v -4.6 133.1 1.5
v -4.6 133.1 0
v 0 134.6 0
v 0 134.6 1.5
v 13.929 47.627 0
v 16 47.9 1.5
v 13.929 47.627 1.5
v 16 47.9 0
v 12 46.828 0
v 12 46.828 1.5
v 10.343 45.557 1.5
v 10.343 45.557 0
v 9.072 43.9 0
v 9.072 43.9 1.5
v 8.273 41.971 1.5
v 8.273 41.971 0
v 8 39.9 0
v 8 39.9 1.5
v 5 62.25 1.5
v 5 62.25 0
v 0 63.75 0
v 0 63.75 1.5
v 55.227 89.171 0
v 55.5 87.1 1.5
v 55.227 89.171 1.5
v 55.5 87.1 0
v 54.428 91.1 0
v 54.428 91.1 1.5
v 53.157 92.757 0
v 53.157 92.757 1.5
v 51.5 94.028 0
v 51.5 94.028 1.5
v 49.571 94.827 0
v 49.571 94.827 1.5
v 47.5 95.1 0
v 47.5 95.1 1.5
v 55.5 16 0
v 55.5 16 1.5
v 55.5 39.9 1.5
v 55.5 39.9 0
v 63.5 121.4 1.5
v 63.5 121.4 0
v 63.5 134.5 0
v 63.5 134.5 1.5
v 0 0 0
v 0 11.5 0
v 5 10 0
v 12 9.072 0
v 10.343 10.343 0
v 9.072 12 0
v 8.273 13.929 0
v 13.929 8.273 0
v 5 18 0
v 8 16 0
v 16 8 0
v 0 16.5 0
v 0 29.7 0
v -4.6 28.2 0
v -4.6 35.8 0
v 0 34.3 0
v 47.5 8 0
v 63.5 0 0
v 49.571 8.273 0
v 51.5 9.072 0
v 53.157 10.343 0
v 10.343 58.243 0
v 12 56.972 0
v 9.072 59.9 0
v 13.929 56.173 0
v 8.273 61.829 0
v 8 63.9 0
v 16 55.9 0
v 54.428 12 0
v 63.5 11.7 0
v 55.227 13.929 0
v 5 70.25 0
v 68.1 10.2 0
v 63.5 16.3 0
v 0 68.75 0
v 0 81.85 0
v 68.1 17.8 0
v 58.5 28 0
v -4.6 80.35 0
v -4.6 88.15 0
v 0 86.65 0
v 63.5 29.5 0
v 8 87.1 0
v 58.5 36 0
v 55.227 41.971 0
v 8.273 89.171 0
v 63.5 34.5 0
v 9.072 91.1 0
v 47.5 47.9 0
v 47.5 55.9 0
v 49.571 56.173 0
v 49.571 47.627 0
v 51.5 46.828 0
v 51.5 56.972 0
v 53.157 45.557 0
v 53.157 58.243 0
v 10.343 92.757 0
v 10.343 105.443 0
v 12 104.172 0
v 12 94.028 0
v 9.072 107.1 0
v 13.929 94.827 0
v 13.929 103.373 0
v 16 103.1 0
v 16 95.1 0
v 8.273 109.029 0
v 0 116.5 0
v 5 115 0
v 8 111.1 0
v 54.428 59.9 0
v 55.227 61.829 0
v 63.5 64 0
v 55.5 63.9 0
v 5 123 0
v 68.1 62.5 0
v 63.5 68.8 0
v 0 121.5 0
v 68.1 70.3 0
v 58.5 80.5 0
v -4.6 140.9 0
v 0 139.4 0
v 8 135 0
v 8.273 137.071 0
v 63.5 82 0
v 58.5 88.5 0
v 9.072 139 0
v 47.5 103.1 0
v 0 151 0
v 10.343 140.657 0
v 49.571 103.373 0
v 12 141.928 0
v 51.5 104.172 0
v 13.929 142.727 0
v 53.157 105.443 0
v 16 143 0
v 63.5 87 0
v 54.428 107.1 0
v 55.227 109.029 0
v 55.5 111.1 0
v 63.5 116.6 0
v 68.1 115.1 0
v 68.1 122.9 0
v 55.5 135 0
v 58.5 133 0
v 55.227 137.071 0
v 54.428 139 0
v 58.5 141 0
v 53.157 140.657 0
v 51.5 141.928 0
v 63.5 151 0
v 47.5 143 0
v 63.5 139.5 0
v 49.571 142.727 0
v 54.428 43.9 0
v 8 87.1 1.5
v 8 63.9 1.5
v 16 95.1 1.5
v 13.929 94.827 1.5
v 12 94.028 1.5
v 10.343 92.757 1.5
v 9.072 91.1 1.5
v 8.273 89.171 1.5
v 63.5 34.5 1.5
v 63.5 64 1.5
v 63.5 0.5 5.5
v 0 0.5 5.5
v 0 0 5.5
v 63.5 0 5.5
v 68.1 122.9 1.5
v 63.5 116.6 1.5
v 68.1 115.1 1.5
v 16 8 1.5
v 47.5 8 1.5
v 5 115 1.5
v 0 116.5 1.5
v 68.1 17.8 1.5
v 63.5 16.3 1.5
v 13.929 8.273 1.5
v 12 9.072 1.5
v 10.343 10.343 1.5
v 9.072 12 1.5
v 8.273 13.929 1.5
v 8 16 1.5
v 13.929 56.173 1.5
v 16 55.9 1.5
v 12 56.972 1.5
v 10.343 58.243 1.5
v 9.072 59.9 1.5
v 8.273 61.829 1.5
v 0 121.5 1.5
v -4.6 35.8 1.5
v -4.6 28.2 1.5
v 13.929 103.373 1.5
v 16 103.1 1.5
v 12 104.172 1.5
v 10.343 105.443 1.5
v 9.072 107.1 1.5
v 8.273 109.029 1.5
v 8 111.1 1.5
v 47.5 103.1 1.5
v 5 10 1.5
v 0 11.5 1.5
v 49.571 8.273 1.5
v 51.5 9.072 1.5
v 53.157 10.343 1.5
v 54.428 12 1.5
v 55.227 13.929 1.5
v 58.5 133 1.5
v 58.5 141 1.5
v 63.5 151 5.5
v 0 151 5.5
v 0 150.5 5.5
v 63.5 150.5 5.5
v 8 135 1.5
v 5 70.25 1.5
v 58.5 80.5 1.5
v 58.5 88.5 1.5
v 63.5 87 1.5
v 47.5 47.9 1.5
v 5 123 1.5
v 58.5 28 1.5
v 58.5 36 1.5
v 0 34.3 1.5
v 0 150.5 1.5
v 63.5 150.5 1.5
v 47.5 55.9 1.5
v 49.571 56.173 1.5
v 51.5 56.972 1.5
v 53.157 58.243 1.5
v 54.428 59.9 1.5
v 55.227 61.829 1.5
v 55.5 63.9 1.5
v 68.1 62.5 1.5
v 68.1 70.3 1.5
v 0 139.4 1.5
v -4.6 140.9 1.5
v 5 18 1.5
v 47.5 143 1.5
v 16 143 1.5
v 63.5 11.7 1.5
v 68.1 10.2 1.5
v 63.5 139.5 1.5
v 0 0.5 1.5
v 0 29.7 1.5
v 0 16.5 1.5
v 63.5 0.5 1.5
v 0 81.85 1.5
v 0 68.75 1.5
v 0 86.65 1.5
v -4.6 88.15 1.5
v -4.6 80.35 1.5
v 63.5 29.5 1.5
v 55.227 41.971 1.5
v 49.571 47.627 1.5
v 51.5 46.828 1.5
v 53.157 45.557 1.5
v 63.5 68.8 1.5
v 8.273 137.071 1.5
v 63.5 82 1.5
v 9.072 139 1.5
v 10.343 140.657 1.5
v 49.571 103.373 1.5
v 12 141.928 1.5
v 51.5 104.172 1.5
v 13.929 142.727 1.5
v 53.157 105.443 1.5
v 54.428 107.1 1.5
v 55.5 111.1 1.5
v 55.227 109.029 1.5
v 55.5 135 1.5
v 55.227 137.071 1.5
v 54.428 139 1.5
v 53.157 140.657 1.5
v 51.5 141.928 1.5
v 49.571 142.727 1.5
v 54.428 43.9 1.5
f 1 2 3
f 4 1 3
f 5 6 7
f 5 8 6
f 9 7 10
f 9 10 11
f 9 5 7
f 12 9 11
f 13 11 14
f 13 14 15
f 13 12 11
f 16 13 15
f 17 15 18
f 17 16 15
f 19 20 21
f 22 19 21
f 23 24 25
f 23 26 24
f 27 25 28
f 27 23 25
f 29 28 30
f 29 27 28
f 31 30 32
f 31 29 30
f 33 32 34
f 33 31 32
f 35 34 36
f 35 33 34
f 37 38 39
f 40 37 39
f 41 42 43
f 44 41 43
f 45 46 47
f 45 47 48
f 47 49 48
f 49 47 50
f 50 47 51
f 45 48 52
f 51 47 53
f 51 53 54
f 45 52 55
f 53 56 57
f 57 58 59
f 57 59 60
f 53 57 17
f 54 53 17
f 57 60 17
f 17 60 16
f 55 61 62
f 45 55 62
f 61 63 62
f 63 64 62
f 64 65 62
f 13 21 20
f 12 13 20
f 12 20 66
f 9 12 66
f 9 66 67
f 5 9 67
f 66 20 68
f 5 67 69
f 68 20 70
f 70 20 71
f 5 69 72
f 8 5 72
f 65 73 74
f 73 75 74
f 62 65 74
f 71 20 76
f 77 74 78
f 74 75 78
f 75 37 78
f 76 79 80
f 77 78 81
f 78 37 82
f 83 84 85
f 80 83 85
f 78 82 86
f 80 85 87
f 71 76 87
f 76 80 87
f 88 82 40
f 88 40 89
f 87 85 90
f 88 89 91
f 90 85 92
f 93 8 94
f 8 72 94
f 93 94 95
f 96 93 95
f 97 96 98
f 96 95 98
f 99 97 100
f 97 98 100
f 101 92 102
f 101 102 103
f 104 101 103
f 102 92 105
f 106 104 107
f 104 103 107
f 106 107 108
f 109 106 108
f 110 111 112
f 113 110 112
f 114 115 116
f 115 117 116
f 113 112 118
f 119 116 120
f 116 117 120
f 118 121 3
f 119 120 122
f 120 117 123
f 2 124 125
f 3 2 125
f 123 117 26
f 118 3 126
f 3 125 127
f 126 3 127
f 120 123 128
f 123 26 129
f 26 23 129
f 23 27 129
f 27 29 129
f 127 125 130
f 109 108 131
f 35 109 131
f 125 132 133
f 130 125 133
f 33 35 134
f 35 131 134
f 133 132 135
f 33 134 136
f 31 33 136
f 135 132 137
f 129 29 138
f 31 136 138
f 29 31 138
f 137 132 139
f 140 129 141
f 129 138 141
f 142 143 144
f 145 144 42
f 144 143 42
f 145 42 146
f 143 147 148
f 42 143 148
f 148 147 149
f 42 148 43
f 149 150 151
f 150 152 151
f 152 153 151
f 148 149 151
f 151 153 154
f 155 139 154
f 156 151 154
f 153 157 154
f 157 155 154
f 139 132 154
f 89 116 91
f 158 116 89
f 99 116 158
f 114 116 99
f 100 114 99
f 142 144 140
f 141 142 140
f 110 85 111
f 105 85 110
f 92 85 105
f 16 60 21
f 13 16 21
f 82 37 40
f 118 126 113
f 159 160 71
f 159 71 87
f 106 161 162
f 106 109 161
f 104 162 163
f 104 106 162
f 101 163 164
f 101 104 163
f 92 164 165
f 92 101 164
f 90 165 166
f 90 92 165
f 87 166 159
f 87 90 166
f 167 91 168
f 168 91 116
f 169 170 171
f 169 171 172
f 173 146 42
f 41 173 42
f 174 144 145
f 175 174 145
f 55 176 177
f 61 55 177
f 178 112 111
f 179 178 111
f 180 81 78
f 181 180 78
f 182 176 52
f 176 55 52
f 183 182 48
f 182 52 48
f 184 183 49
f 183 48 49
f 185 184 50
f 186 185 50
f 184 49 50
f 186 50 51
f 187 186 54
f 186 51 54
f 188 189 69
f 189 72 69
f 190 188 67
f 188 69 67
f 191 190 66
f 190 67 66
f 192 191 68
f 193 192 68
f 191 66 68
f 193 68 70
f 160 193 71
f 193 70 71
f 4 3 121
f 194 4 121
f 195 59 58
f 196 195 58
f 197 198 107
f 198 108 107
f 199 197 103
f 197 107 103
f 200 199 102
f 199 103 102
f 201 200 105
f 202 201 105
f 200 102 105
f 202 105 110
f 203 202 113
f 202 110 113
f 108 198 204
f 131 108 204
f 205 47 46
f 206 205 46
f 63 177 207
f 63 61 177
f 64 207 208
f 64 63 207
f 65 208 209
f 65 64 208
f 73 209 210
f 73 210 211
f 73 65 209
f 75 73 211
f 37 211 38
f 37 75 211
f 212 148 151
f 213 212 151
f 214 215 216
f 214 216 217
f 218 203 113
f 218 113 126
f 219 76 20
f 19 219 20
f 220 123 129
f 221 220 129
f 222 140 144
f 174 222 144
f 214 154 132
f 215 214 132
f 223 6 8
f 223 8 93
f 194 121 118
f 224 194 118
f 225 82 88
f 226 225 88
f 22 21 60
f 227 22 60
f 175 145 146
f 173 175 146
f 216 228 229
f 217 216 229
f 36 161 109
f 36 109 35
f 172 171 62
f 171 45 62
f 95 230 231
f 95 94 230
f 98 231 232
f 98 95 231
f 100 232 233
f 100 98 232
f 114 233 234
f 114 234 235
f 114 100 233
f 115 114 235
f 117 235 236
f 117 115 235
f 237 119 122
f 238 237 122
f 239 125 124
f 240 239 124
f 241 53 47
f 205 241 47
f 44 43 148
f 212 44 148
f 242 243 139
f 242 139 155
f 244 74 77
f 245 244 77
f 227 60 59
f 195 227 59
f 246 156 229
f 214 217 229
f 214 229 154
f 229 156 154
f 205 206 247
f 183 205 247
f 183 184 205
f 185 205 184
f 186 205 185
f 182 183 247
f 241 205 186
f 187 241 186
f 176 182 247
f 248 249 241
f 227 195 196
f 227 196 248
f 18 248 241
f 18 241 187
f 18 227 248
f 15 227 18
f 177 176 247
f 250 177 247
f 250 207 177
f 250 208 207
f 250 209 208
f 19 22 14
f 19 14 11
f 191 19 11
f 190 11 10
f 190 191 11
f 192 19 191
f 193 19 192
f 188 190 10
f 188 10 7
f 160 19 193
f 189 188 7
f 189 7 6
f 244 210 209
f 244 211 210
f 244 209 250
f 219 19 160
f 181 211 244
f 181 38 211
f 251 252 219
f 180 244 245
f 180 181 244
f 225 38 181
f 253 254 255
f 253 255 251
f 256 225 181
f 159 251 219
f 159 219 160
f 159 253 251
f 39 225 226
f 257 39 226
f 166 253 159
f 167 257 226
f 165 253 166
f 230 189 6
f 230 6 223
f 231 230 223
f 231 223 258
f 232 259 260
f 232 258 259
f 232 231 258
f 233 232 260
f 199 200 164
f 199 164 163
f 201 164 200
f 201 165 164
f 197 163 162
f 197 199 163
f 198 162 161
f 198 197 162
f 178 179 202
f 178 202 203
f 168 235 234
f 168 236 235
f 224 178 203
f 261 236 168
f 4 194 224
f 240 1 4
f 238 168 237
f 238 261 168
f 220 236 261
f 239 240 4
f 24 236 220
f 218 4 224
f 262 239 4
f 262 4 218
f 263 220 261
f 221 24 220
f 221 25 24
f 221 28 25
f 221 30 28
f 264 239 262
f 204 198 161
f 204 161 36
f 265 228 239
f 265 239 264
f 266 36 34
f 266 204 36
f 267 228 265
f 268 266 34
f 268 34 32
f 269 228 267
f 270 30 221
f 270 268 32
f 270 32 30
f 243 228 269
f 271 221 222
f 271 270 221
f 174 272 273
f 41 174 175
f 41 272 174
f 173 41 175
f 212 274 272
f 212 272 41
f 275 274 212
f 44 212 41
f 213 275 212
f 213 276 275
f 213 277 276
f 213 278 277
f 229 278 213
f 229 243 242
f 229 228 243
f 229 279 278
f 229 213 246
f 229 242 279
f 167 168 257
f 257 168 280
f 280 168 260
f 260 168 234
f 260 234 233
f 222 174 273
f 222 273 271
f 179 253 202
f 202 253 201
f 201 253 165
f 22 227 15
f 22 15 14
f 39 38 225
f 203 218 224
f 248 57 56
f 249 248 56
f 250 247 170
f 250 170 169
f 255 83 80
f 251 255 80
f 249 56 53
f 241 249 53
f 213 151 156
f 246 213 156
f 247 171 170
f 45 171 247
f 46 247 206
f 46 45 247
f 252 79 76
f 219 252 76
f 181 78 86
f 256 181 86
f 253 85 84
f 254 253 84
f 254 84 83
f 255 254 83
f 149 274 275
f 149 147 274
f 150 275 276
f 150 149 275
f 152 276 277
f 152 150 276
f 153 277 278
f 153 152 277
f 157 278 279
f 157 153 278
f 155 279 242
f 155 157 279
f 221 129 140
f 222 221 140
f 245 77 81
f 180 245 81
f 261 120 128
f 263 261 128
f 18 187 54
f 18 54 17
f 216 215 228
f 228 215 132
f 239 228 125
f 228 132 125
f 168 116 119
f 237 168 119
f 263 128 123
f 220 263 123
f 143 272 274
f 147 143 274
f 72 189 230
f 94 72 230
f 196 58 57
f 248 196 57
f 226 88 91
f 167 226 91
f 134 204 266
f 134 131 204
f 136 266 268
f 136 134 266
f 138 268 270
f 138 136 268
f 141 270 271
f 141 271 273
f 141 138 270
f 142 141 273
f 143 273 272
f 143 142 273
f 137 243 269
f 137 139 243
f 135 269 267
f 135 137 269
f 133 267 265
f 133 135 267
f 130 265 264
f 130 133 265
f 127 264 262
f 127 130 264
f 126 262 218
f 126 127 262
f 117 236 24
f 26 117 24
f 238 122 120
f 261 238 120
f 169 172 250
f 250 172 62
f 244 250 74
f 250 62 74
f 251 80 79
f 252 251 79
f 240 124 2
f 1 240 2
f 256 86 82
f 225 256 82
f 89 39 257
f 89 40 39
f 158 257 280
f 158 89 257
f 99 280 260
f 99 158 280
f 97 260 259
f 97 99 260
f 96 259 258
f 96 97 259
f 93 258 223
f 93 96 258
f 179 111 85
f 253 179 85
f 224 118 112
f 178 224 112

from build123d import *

# Parameters (mm, degrees)
F1_DEPTH = 1.5
F2_W     = 63.5
F2_H     = 0.5
F3_DEPTH = 4
F4_W     = 47.5
F4_H     = 39.9
F4_H_2   = 39.2
F5_DEPTH = 1.501
F6_R     = 8


with BuildPart() as f1:
    # F0 (on Top) → F1 (new body)
    with BuildSketch(Plane.XY):
        Polygon((0, 11.5), (0, 0), (63.5, 0), (63.5, 11.7), (68.1, 10.2), (68.1, 17.8), (63.5, 16.3), (63.5, 29.5), (58.5, 28), (58.5, 36), (63.5, 34.5), (63.5, 64), (68.1, 62.5), (68.1, 70.3), (63.5, 68.8), (63.5, 82), (58.5, 80.5), (58.5, 88.5), (63.5, 87), (63.5, 116.6), (68.1, 115.1), (68.1, 122.9), (63.5, 121.4), (63.5, 134.5), (58.5, 133), (58.5, 141), (63.5, 139.5), (63.5, 151), (0, 151), (0, 139.4), (-4.6, 140.9), (-4.6, 133.1), (0, 134.6), (0, 121.5), (5, 123), (5, 115), (0, 116.5), (0, 86.65), (-4.6, 88.15), (-4.6, 80.35), (0, 81.85), (0, 68.75), (5, 70.25), (5, 62.25), (0, 63.75), (0, 34.3), (-4.6, 35.8), (-4.6, 28.2), (0, 29.7), (0, 16.5), (5, 18), (5, 10), align=None)
    extrude(amount=F1_DEPTH)

    # F2 (on face) → F3 (join)
    with BuildSketch(Plane.XY.offset(1.5)):
        with Locations((31.75, 0.25)):
            Rectangle(F2_W, F2_H)
        with Locations((31.75, 150.75)):
            Rectangle(F2_W, F2_H)
    extrude(amount=F3_DEPTH)

    # F4 (on face) → F5 (cut, through all)
    with BuildSketch(Plane.XY.offset(1.5)):
        with Locations((31.75, 123.05)):
            Rectangle(F4_W, F4_H)
        with Locations((31.75, 75.5)):
            Rectangle(F4_W, F4_H_2)
        with Locations((31.75, 27.95)):
            Rectangle(F4_W, F4_H)
    extrude(amount=-F5_DEPTH, mode=Mode.SUBTRACT)

    # F6
    f6_edges = [f1.edges().sort_by_distance(p)[0] for p in [
        (8, 143, 0.75),
        (8, 95.1, 0.75),
        (8, 47.9, 0.75),
        (8, 103.1, 0.75),
        (8, 55.9, 0.75),
        (8, 8, 0.75),
        (55.5, 8, 0.75),
        (55.5, 55.9, 0.75),
        (55.5, 103.1, 0.75),
        (55.5, 143, 0.75),
        (55.5, 95.1, 0.75),
        (55.5, 47.9, 0.75),
    ]]
    fillet(f6_edges, radius=F6_R)


solid = f1.part
